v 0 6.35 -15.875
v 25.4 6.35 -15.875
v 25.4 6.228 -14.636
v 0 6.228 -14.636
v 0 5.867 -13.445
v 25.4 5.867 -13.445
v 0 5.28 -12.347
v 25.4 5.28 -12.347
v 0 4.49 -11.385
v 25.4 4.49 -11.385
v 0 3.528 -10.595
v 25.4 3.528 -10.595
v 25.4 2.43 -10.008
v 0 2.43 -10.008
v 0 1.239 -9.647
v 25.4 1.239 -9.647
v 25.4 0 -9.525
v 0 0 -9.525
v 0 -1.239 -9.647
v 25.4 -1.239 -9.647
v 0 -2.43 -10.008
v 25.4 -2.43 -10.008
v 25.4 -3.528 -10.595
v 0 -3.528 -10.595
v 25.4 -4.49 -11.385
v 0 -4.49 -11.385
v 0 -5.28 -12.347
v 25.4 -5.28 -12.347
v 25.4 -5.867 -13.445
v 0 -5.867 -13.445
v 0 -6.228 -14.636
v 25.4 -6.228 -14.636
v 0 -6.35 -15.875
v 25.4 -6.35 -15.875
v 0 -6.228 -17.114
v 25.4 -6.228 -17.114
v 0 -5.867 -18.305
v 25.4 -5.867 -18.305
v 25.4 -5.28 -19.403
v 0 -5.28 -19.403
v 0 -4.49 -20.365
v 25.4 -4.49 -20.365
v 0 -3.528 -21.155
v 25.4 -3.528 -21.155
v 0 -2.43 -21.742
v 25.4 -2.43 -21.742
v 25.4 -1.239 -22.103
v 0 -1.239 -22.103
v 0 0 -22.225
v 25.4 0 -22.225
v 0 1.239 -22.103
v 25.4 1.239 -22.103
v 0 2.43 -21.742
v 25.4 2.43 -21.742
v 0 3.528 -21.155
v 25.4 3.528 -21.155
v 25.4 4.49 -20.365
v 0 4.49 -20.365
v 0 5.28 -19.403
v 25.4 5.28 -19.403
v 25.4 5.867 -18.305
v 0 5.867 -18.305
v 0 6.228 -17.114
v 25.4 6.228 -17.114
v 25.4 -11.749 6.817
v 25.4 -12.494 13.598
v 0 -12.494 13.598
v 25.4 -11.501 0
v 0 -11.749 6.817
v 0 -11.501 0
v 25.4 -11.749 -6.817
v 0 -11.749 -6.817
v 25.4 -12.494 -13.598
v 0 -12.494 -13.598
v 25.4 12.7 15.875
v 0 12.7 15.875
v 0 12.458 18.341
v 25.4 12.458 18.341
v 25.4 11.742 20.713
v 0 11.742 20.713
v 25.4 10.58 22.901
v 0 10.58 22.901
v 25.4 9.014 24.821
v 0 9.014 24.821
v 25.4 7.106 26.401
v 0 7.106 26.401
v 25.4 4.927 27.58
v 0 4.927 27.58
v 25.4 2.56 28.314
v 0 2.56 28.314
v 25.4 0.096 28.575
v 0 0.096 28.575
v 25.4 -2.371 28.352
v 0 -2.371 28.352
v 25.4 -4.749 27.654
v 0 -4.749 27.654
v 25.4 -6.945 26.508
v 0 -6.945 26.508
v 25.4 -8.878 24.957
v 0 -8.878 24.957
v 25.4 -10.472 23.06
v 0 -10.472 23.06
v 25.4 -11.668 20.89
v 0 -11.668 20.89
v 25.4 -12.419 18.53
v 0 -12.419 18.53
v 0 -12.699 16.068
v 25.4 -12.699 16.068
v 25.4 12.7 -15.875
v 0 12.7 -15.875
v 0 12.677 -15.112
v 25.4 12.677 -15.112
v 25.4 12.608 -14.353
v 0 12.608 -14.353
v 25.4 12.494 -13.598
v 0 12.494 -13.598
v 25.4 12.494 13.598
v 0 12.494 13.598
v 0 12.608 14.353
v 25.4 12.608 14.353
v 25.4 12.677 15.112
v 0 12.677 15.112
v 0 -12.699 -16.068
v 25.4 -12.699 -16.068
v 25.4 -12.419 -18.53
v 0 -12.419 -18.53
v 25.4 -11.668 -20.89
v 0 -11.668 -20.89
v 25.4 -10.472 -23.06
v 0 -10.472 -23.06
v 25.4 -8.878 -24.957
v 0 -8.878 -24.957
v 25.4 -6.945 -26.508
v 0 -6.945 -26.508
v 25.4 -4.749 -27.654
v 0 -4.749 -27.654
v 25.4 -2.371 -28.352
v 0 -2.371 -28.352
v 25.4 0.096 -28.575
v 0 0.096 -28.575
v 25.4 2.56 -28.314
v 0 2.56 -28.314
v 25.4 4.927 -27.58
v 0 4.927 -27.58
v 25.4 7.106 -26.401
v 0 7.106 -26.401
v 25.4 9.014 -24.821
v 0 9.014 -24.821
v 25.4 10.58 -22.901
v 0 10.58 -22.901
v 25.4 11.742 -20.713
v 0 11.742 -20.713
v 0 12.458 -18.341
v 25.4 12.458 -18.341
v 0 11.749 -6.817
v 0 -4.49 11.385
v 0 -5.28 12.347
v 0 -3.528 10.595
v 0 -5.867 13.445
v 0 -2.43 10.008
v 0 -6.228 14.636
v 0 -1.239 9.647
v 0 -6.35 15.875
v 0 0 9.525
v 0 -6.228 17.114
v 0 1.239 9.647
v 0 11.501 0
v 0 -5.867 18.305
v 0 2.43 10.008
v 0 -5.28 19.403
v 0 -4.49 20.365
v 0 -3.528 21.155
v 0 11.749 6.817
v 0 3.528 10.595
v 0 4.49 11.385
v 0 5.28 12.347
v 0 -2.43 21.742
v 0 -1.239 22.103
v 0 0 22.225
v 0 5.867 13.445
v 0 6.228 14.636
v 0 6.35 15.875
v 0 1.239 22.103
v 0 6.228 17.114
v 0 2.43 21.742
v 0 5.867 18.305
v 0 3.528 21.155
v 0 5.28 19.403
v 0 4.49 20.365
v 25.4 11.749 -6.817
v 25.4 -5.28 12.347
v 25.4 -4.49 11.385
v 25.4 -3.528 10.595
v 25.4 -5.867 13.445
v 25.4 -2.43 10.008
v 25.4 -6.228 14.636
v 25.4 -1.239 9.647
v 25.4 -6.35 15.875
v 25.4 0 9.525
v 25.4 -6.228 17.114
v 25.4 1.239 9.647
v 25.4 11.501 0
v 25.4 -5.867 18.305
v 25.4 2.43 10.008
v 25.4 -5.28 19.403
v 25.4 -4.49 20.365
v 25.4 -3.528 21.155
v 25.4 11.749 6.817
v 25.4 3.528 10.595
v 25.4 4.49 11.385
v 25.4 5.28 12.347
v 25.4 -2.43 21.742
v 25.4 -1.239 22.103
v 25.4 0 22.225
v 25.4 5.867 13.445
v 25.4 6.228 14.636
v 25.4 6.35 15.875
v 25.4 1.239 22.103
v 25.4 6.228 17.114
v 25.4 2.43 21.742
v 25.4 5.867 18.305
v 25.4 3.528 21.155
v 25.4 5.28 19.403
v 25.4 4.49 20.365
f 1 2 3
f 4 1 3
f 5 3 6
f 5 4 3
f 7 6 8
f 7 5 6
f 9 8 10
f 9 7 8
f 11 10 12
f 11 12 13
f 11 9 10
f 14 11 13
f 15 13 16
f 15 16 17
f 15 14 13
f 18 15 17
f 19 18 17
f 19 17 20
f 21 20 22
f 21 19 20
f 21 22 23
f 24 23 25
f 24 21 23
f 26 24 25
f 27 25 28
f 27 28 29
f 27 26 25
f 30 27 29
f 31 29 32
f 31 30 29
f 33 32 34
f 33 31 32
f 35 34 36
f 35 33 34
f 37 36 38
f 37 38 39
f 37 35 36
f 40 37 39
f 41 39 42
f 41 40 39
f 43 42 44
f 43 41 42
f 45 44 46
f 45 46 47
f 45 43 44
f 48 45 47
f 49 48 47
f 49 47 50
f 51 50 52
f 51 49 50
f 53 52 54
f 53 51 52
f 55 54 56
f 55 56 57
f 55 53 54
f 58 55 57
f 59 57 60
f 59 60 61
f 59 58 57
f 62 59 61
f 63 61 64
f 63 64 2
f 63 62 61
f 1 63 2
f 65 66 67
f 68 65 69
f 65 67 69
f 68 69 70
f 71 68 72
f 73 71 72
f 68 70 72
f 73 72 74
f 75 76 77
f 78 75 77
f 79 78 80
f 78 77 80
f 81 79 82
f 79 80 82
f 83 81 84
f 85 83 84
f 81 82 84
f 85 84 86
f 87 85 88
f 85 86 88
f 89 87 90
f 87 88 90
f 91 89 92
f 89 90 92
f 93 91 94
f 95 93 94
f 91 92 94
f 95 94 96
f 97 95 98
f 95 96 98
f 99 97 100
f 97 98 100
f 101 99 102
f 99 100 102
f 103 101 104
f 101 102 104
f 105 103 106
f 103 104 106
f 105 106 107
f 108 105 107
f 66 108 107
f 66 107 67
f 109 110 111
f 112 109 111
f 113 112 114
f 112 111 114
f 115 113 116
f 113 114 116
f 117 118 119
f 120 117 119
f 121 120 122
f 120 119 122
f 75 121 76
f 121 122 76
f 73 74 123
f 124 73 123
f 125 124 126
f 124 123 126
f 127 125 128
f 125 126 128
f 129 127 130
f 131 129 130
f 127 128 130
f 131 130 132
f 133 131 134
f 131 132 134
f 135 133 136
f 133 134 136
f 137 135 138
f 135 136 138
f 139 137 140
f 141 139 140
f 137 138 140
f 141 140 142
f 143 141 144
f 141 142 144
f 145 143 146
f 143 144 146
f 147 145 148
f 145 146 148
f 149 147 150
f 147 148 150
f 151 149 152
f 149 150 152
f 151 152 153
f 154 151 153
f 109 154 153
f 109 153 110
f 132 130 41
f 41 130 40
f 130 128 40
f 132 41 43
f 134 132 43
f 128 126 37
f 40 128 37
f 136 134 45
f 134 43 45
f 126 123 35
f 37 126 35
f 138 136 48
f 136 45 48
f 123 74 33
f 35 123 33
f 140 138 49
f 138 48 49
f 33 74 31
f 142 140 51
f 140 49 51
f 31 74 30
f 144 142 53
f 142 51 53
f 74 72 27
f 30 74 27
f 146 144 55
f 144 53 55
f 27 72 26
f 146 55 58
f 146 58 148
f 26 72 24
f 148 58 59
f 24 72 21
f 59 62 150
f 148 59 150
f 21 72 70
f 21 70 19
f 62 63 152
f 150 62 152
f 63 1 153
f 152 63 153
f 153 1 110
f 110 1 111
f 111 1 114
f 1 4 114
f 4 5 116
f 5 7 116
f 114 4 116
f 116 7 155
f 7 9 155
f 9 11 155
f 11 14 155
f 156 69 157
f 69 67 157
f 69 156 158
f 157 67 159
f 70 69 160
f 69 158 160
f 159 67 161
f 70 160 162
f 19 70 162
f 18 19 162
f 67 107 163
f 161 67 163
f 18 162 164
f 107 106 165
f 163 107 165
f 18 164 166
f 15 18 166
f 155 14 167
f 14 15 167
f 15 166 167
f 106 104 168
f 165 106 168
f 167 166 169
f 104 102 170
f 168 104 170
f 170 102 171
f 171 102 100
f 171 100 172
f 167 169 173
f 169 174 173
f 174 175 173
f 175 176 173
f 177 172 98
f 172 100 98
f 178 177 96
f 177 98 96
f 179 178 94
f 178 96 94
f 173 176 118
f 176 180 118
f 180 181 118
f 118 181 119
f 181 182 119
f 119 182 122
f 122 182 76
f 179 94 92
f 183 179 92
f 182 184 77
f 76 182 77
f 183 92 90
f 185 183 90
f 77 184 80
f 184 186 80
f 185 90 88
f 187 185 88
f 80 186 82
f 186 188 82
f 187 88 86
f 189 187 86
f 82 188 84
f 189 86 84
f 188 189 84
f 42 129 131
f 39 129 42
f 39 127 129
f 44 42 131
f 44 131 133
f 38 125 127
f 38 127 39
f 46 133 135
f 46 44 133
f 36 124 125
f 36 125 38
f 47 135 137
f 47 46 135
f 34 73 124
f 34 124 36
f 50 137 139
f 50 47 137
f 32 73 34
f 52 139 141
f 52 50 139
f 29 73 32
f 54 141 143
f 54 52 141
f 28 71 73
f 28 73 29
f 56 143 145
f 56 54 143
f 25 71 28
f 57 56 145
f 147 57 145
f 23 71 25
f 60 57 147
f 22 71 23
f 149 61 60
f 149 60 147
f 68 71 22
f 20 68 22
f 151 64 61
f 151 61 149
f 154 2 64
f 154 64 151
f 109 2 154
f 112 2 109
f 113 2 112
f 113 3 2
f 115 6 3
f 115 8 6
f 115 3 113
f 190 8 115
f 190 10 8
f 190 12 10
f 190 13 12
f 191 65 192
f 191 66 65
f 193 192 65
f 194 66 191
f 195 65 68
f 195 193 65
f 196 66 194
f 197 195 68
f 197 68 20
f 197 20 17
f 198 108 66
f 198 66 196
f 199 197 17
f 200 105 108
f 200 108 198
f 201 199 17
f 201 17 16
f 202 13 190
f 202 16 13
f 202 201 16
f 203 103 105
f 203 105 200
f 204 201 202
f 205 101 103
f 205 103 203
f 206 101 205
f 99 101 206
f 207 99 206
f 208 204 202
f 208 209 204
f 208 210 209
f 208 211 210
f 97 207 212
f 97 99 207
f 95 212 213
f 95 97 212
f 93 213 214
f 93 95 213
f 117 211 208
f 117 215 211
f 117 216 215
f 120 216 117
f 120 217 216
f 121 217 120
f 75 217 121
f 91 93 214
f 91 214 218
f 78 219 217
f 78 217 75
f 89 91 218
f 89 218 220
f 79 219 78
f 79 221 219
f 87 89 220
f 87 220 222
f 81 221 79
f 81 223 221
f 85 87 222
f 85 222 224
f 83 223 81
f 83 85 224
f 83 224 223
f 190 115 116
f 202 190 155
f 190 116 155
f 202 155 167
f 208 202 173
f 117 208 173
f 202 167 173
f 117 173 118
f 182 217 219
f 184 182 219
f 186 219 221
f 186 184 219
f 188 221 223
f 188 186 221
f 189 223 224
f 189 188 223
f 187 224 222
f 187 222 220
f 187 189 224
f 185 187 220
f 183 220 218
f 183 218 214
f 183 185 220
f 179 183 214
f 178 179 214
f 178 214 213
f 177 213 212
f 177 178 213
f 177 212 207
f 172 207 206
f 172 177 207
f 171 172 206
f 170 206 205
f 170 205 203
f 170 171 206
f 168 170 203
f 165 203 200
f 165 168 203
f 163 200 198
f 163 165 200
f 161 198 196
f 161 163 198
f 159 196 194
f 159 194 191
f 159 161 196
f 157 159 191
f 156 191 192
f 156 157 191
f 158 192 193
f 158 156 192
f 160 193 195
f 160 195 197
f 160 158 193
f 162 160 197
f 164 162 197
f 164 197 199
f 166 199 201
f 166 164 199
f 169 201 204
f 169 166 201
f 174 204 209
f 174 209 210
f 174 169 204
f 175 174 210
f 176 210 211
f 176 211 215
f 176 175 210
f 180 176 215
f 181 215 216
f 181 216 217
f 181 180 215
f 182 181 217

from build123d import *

# Parameters (mm, degrees)
F0_R     = 6.35
F1_DEPTH = 25.4


# Not quite as in the source:
# - a feature names something its author has since deleted; it is built from what else it names


with BuildPart() as f1:
    # F0 (on Right) → F1 (new body)
    with BuildSketch(Plane.YZ):
        with BuildLine():
            ThreePointArc((12.4942827194, 13.5984018078), (12.6484661231, 14.7320631111), (12.7, 15.875))
            ThreePointArc((12.7, 15.875), (-1.1429368889, 28.5234661231), (-12.4942827194, 13.5984018078))
            ThreePointArc((-12.4942827194, 13.5984018078), (0, 3.175), (12.4942827194, 13.5984018078))
        make_face()
        with Locations((0, 15.875)):
            Circle(F0_R, mode=Mode.SUBTRACT)
        with BuildLine():
            ThreePointArc((12.4942827194, -13.5984018078), (0, -3.175), (-12.4942827194, -13.5984018078))
            ThreePointArc((-12.4942827194, -13.5984018078), (-1.1429368889, -28.5234661231), (12.7, -15.875))
            ThreePointArc((12.7, -15.875), (12.6484661231, -14.7320631111), (12.4942827194, -13.5984018078))
        make_face()
        with Locations((0, -15.875)):
            Circle(F0_R, mode=Mode.SUBTRACT)
        with BuildLine():
            ThreePointArc((12.4942827194, 13.5984018078), (0, 3.175), (-12.4942827194, 13.5984018078))
            ThreePointArc((-12.4942827194, 13.5984018078), (-11.5006568446, 0), (-12.4942827194, -13.5984018078))
            ThreePointArc((-12.4942827194, -13.5984018078), (0, -3.175), (12.4942827194, -13.5984018078))
            ThreePointArc((12.4942827194, -13.5984018078), (11.5006568446, 0), (12.4942827194, 13.5984018078))
        make_face()
    extrude(amount=F1_DEPTH)


solid = f1.part
